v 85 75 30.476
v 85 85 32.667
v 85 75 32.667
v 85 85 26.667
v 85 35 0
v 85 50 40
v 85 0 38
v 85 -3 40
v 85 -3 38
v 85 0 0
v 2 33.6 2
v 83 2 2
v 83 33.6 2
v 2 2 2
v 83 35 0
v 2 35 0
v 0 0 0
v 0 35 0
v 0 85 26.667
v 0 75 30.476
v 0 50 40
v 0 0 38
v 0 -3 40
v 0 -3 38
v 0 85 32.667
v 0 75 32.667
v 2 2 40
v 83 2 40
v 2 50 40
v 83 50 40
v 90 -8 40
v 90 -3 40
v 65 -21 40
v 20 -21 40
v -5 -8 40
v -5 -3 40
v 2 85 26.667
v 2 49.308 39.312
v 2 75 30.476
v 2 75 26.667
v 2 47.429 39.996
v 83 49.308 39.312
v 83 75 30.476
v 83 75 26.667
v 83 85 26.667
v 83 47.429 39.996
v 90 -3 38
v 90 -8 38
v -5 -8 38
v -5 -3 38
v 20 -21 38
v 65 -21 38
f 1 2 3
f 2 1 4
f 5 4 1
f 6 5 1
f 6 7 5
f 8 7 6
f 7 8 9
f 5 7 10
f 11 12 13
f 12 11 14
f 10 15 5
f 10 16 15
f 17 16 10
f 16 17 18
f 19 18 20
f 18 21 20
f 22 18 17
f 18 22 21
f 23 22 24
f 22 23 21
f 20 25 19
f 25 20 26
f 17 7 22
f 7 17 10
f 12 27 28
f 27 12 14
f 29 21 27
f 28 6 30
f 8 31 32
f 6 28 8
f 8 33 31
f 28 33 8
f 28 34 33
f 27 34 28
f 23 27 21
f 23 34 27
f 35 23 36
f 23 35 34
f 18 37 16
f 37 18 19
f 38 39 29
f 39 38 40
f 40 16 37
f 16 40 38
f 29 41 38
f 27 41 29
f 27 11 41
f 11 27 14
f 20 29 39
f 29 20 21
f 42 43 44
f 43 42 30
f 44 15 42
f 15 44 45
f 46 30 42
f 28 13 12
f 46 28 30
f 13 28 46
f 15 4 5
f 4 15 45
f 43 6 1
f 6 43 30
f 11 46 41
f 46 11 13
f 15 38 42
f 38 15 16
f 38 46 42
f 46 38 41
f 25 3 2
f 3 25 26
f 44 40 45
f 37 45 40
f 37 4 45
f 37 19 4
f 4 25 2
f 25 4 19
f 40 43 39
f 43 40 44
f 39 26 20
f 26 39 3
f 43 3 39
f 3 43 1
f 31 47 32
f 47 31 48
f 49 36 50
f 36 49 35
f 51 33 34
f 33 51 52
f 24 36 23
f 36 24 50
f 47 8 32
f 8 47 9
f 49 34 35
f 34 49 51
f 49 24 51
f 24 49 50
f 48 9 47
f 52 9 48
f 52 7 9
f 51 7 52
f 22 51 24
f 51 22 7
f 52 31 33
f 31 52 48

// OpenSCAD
width = 85;
top_depth = 50;
bottom_depth = 35;
height = 40;
thickness = 2;

cube([width, bottom_depth, thickness]);

translate([0, thickness, 0]) 
    rotate([90,0,0]) 
    cube([width, height, thickness]);

rotate([0,0,90]) 
    rotate([90,0,0]) 
    linear_extrude(height = thickness) 
    polygon(points=[[0,0],[bottom_depth,0],[top_depth+bottom_depth,height*2/3],[top_depth,height],[0,height]]);

translate([width-thickness, 0, 0]) 
    rotate([0,0,90]) 
    rotate([90,0,0]) 
    linear_extrude(height = thickness) 
    polygon(points=[[0,0],[bottom_depth,0],[top_depth+bottom_depth,height*2/3],[top_depth,height],[0,height]]);

translate([0, bottom_depth, 0]) 
    rotate([-20,0,0]) 
    rotate([90,0,0]) 
    cube([width, height+1.835, thickness]);
    
translate([0, 75, height*2/3]) 
    cube([width, 10, 6]);

translate([-5, -3, height])
    rotate([180,0,0]) 
    linear_extrude(height = thickness) 
    polygon(points=[[0,0],[width + 10,0],[width + 10,5],[width + 10 - 25,18],[25,18], [0,5]]);
    
translate([0, -3, height-thickness])
    cube([width, 3, thickness]);
